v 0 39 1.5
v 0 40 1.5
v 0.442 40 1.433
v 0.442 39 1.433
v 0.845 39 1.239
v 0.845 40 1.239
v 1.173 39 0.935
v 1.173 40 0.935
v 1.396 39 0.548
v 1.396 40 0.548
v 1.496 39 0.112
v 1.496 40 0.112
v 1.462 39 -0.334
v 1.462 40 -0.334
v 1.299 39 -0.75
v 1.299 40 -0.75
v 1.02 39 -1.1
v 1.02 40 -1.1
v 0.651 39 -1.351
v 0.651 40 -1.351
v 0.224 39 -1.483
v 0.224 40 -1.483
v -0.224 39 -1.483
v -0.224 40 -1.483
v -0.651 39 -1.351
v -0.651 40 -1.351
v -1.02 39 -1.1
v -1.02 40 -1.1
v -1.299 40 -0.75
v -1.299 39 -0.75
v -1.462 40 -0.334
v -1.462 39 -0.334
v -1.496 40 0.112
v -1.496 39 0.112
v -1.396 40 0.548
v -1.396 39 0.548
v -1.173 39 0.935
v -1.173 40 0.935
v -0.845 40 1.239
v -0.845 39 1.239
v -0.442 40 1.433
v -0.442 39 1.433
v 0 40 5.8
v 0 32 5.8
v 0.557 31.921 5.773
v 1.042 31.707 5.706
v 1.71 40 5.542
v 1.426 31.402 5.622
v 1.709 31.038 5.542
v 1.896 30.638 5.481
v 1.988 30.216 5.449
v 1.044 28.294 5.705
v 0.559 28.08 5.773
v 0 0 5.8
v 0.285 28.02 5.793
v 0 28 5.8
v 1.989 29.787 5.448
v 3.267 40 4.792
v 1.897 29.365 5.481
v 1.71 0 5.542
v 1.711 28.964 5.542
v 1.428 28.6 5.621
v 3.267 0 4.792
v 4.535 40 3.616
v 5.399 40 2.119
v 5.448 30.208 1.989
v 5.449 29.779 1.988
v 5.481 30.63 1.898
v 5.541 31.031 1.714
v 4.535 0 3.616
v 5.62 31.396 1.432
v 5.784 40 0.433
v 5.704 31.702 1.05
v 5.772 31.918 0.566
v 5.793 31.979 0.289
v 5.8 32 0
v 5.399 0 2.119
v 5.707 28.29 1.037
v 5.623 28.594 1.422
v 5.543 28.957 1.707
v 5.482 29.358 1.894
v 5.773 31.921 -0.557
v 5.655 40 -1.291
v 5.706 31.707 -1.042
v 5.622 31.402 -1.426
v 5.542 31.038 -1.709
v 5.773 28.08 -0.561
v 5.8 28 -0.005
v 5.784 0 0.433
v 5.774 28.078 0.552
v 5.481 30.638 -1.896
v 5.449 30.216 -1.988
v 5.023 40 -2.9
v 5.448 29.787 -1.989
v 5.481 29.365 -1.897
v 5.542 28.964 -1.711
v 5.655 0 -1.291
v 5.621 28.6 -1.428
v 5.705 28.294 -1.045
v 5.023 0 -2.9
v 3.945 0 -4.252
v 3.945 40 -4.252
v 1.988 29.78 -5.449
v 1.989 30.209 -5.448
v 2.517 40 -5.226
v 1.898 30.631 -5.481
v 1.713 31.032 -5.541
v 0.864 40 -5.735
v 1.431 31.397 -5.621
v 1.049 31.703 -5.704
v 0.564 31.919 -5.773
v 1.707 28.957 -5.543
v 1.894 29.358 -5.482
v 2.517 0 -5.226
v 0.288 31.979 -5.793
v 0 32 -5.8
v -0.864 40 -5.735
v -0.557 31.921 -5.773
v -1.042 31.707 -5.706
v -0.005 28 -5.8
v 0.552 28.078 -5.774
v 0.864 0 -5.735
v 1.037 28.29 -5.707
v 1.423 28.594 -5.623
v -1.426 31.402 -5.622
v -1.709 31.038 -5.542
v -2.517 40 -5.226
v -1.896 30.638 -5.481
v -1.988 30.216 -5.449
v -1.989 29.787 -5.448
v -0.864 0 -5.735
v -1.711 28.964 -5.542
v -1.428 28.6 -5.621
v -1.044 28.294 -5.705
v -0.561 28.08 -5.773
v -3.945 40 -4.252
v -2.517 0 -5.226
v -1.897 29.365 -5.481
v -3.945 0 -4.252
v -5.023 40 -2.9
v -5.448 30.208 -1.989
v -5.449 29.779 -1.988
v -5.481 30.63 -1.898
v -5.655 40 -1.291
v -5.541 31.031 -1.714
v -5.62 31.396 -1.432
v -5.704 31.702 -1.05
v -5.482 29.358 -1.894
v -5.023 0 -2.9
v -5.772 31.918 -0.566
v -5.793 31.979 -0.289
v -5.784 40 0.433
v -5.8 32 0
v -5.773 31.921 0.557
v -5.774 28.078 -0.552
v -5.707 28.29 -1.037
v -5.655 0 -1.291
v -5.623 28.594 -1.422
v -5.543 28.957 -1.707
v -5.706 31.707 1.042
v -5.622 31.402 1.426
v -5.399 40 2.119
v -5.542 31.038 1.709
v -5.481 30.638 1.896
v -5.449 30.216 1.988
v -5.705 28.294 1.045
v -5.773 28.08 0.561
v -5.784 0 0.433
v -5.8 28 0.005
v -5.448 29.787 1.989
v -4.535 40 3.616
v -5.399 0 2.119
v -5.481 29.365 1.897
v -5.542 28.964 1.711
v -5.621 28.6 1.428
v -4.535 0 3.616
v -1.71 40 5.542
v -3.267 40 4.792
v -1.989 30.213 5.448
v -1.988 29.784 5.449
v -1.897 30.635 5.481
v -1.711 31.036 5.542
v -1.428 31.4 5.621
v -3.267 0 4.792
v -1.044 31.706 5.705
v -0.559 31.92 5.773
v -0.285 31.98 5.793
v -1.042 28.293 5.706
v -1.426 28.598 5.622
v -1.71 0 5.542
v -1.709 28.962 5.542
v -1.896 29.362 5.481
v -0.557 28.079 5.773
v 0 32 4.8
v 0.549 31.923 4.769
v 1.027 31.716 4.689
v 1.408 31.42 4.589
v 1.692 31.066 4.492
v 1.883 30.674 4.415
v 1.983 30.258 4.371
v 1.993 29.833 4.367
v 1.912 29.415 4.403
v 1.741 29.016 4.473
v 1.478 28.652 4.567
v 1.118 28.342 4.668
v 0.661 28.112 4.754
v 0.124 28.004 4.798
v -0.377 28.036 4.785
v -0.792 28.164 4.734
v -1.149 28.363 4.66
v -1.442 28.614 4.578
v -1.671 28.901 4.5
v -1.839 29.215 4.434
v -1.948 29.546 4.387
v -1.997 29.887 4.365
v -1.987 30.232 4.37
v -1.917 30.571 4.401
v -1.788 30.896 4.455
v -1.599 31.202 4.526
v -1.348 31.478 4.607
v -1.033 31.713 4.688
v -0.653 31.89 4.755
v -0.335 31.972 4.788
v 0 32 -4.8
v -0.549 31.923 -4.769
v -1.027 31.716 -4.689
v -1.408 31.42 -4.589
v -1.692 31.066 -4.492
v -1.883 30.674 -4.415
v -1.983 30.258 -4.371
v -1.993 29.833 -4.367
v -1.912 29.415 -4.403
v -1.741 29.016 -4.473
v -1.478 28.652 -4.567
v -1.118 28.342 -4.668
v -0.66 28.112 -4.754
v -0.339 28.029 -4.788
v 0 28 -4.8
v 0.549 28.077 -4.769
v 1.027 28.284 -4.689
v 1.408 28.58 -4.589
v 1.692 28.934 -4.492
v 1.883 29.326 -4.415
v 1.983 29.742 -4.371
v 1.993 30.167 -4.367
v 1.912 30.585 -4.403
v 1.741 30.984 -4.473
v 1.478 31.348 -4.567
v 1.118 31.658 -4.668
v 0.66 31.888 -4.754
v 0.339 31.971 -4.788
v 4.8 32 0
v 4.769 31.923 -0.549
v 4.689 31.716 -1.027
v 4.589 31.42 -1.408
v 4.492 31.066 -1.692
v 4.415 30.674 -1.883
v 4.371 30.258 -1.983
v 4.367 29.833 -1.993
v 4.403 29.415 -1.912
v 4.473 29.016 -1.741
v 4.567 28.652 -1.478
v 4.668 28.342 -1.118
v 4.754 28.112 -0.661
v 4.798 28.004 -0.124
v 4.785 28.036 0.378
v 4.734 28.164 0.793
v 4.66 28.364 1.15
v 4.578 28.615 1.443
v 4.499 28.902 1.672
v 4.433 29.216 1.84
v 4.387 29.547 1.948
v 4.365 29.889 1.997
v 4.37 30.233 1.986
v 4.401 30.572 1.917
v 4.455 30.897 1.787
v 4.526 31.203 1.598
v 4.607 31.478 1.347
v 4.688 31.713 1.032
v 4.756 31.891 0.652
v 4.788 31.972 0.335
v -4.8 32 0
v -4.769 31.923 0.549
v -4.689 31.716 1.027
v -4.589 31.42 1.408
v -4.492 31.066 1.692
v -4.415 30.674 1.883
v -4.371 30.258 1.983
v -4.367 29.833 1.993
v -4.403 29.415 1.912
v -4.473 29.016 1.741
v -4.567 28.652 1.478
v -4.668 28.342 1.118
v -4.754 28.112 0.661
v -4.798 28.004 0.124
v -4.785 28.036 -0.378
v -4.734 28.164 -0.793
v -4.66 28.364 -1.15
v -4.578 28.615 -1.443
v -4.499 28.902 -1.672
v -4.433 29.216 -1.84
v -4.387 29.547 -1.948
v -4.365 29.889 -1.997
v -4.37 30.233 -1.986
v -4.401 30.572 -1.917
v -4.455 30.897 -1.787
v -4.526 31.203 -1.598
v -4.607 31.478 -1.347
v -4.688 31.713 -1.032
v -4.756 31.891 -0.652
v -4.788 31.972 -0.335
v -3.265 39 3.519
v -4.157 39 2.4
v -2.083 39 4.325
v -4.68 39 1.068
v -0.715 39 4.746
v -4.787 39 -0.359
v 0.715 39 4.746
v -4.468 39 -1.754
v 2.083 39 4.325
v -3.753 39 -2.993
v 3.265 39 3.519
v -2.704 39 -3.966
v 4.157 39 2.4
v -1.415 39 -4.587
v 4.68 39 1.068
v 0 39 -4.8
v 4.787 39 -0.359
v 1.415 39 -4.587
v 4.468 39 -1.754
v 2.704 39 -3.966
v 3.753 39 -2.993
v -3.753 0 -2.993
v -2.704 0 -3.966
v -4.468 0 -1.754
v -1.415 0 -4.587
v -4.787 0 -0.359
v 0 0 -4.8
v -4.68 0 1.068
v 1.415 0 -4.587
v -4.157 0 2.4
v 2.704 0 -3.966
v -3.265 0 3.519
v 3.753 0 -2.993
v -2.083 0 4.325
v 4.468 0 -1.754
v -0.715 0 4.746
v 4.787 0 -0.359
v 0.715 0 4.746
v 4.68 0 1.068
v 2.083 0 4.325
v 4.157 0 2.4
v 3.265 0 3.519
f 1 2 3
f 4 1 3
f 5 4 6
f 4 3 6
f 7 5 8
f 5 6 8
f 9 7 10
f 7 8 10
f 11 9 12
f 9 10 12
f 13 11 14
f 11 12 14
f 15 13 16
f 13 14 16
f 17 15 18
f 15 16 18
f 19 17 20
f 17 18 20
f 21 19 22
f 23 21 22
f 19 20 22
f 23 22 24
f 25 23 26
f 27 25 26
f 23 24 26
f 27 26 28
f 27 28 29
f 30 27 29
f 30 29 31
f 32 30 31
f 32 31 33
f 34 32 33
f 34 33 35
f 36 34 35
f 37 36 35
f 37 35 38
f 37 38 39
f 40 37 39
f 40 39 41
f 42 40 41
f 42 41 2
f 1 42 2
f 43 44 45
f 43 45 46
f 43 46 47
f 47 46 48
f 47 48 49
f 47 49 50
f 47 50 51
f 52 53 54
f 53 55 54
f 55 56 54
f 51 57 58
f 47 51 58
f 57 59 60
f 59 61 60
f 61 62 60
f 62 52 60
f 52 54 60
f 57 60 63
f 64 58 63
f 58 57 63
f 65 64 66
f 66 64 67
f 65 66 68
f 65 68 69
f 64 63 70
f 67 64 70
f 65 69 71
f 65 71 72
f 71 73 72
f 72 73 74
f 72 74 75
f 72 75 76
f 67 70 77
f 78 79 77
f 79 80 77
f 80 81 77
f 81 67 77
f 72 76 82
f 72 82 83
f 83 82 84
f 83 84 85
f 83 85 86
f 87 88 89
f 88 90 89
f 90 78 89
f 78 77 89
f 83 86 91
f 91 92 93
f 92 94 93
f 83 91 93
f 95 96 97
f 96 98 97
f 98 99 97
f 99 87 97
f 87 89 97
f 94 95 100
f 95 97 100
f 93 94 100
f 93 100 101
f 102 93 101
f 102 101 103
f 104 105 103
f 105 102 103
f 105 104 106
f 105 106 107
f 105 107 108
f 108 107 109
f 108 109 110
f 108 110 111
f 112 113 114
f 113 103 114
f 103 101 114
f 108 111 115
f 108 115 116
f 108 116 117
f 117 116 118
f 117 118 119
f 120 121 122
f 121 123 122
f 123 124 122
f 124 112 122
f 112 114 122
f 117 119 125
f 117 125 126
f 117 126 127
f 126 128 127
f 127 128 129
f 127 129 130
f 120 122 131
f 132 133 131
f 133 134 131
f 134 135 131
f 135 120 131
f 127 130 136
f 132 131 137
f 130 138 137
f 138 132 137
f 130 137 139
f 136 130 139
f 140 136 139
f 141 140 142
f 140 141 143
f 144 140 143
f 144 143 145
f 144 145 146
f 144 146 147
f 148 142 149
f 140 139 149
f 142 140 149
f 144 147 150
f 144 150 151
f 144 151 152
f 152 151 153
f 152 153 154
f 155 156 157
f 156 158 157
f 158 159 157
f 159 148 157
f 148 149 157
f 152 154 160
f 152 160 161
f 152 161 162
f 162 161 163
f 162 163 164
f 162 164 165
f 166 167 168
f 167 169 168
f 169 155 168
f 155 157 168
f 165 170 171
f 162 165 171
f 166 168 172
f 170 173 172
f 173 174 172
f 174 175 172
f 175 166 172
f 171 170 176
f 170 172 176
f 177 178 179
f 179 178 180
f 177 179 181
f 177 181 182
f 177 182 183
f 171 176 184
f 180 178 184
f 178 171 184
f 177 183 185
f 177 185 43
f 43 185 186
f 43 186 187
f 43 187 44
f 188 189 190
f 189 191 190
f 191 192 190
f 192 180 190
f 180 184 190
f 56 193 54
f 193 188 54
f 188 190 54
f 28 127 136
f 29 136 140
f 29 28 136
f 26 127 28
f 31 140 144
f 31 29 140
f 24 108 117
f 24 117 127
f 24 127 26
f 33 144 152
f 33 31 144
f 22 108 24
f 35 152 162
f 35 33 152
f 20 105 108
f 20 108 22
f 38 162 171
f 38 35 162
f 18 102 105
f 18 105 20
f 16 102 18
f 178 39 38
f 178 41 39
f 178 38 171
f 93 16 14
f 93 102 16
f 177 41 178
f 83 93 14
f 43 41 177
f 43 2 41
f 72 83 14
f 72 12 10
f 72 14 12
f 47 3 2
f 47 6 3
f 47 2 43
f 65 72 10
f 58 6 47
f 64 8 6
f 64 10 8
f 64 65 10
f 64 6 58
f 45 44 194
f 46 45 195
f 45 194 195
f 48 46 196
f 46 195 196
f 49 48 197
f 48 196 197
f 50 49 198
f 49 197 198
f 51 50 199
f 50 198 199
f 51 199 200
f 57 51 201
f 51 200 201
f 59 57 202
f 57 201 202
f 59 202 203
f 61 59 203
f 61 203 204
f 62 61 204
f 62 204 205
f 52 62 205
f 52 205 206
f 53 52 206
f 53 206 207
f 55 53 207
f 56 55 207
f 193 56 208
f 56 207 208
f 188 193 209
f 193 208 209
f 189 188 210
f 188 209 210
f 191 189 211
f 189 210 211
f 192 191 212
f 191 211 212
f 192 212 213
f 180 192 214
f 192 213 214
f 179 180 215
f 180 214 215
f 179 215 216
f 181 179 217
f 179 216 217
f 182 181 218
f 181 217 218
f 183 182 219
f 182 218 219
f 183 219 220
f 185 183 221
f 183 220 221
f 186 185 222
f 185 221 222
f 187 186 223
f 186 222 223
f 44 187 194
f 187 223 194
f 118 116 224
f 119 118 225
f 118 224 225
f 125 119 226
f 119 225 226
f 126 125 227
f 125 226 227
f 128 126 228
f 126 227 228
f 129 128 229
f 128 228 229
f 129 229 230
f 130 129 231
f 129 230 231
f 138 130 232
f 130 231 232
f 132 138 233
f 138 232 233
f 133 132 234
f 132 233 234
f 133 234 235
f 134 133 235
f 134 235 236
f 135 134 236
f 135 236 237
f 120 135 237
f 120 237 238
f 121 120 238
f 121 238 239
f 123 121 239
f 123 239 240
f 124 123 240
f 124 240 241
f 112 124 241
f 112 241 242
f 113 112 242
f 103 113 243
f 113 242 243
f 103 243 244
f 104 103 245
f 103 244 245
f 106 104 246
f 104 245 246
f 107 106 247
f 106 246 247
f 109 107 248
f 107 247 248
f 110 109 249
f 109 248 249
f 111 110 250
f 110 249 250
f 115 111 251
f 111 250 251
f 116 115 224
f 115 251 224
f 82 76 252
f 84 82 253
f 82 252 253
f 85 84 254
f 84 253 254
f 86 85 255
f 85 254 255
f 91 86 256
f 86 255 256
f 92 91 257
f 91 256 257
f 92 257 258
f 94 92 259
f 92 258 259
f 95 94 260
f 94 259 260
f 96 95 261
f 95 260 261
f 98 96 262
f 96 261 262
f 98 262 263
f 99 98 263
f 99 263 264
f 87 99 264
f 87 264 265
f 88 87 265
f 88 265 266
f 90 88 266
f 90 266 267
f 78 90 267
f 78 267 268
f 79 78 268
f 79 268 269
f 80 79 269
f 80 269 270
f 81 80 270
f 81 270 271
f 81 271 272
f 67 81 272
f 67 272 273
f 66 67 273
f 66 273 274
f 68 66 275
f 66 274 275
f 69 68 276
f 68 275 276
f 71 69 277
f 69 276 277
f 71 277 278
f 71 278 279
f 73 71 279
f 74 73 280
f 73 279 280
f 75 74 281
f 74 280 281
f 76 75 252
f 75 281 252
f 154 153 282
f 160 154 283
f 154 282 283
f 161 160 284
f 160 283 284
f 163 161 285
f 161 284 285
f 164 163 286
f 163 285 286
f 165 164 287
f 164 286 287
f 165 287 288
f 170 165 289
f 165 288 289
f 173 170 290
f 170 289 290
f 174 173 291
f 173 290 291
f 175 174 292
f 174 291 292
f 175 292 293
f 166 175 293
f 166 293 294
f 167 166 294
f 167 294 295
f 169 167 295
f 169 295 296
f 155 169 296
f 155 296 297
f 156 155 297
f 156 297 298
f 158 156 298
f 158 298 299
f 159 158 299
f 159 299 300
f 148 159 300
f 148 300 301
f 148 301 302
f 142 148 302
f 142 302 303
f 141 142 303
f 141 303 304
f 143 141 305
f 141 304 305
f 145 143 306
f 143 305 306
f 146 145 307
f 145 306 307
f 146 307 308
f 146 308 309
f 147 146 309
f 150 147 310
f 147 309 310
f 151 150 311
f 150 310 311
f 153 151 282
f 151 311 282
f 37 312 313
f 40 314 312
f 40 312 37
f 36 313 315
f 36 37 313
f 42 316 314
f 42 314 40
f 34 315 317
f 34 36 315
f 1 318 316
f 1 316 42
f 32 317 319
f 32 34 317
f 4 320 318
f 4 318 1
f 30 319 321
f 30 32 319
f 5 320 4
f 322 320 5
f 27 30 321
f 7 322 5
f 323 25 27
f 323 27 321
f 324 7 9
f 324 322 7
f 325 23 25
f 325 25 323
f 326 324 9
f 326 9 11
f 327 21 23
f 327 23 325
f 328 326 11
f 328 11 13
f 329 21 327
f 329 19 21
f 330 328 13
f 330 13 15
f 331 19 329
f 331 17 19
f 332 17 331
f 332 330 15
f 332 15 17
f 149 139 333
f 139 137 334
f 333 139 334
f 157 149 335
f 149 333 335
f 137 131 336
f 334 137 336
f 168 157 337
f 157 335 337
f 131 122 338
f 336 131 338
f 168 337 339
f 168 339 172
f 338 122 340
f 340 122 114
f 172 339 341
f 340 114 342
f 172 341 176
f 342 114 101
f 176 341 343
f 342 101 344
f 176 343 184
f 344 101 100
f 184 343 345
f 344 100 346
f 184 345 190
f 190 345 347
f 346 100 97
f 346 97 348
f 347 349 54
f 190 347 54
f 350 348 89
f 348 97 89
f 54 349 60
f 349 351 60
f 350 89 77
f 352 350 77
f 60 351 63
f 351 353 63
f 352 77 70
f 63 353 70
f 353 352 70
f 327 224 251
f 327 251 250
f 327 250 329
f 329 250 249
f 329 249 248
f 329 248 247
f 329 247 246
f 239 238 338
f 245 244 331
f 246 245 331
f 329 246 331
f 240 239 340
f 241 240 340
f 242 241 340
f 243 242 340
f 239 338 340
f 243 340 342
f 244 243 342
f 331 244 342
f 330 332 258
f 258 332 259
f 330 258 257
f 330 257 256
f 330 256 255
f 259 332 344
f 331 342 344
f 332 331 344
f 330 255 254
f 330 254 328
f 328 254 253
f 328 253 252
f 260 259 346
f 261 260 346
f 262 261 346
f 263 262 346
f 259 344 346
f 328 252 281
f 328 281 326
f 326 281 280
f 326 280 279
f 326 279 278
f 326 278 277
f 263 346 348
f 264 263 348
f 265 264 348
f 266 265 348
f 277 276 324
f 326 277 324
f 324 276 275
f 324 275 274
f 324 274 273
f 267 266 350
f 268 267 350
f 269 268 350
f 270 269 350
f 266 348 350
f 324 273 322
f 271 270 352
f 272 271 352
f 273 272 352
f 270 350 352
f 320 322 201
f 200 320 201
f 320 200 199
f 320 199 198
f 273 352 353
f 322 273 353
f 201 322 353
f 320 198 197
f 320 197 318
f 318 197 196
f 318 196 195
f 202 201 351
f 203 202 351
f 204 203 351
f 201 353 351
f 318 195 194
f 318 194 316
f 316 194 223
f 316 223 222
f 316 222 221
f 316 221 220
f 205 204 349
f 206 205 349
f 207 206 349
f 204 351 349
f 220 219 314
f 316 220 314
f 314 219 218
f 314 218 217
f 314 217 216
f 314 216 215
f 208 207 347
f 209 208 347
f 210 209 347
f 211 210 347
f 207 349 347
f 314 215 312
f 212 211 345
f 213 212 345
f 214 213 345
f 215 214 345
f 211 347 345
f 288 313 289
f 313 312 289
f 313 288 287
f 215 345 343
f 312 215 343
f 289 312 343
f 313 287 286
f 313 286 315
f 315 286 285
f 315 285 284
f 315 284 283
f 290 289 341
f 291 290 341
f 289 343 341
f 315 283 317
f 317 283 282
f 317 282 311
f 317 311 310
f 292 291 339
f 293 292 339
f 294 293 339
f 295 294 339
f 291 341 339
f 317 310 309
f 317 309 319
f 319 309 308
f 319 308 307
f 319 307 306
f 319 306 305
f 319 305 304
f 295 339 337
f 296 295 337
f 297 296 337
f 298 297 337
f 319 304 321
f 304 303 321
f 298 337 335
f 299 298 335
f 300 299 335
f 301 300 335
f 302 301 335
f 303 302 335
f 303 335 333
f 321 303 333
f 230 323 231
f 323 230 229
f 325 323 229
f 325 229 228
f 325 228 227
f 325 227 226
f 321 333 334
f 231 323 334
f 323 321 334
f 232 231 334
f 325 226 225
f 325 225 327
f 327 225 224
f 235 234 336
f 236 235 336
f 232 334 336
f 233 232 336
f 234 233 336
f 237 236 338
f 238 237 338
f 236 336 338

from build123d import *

# Parameters (mm, degrees)
SKETCH1_R           = 5.8
BOSS_EXTRUDE1_DEPTH = 40
SKETCH3_R           = 4.8
CUT_EXTRUDE1_DEPTH  = 39
SKETCH6_R           = 2
CUT_EXTRUDE3_DEPTH  = 41.832340124
CIRPATTERN1_COUNT   = 4
CUT_EXTRUDE4_REACH  = 42.832
SKETCH7_R           = 1.5


with BuildPart() as part:
    # Sketch1 → Boss-Extrude1 (new body)
    with BuildSketch(Plane(origin=(0, 0, 0), x_dir=(1, 0, 0), z_dir=(0, 1, 0))):
        with Locations(Location((0, 0, 0), (0, 0, 270))):
            Circle(SKETCH1_R)
    extrude(amount=BOSS_EXTRUDE1_DEPTH)

    # Sketch3 → Cut-Extrude1 (cut)
    with BuildSketch(Plane.XZ):
        with Locations(Location((0, 0, 0), (0, 0, 270))):
            Circle(SKETCH3_R)
    extrude(amount=-CUT_EXTRUDE1_DEPTH, mode=Mode.SUBTRACT)

    # Sketch6 → Cut-Extrude3 (cut, through all)
    with BuildSketch(Plane.XY):
        with Locations(Location((0, 30, 0), (0, 0, 90))):
            Circle(SKETCH6_R)
    cut_extrude3 = extrude(amount=-CUT_EXTRUDE3_DEPTH, mode=Mode.SUBTRACT)

    # CirPattern1: Cut-Extrude3 ×4 about axis
    cirpattern1_axis = Axis((0, 40, 0), (0, -1, 0))
    for i in range(1, CIRPATTERN1_COUNT):
        add(cut_extrude3.rotate(cirpattern1_axis, i * 360 / CIRPATTERN1_COUNT), mode=Mode.SUBTRACT)

    # Sketch7 → Cut-Extrude4 (cut, up to next)
    with BuildSketch(Plane(origin=(0, 40, 0), x_dir=(1, 0, 0), z_dir=(0, 1, 0)), mode=Mode.PRIVATE) as cut_extrude4_sk1:
        with Locations(Location((0, 0, 0), (0, 0, 270))):
            Circle(SKETCH7_R)
    cut_extrude4_tool1 = extrude(cut_extrude4_sk1.sketch, amount=-CUT_EXTRUDE4_REACH, mode=Mode.PRIVATE) & part.part
    add(cut_extrude4_tool1.solids().sort_by_distance((0, 40, 0))[0], mode=Mode.SUBTRACT)


solid = part.part
